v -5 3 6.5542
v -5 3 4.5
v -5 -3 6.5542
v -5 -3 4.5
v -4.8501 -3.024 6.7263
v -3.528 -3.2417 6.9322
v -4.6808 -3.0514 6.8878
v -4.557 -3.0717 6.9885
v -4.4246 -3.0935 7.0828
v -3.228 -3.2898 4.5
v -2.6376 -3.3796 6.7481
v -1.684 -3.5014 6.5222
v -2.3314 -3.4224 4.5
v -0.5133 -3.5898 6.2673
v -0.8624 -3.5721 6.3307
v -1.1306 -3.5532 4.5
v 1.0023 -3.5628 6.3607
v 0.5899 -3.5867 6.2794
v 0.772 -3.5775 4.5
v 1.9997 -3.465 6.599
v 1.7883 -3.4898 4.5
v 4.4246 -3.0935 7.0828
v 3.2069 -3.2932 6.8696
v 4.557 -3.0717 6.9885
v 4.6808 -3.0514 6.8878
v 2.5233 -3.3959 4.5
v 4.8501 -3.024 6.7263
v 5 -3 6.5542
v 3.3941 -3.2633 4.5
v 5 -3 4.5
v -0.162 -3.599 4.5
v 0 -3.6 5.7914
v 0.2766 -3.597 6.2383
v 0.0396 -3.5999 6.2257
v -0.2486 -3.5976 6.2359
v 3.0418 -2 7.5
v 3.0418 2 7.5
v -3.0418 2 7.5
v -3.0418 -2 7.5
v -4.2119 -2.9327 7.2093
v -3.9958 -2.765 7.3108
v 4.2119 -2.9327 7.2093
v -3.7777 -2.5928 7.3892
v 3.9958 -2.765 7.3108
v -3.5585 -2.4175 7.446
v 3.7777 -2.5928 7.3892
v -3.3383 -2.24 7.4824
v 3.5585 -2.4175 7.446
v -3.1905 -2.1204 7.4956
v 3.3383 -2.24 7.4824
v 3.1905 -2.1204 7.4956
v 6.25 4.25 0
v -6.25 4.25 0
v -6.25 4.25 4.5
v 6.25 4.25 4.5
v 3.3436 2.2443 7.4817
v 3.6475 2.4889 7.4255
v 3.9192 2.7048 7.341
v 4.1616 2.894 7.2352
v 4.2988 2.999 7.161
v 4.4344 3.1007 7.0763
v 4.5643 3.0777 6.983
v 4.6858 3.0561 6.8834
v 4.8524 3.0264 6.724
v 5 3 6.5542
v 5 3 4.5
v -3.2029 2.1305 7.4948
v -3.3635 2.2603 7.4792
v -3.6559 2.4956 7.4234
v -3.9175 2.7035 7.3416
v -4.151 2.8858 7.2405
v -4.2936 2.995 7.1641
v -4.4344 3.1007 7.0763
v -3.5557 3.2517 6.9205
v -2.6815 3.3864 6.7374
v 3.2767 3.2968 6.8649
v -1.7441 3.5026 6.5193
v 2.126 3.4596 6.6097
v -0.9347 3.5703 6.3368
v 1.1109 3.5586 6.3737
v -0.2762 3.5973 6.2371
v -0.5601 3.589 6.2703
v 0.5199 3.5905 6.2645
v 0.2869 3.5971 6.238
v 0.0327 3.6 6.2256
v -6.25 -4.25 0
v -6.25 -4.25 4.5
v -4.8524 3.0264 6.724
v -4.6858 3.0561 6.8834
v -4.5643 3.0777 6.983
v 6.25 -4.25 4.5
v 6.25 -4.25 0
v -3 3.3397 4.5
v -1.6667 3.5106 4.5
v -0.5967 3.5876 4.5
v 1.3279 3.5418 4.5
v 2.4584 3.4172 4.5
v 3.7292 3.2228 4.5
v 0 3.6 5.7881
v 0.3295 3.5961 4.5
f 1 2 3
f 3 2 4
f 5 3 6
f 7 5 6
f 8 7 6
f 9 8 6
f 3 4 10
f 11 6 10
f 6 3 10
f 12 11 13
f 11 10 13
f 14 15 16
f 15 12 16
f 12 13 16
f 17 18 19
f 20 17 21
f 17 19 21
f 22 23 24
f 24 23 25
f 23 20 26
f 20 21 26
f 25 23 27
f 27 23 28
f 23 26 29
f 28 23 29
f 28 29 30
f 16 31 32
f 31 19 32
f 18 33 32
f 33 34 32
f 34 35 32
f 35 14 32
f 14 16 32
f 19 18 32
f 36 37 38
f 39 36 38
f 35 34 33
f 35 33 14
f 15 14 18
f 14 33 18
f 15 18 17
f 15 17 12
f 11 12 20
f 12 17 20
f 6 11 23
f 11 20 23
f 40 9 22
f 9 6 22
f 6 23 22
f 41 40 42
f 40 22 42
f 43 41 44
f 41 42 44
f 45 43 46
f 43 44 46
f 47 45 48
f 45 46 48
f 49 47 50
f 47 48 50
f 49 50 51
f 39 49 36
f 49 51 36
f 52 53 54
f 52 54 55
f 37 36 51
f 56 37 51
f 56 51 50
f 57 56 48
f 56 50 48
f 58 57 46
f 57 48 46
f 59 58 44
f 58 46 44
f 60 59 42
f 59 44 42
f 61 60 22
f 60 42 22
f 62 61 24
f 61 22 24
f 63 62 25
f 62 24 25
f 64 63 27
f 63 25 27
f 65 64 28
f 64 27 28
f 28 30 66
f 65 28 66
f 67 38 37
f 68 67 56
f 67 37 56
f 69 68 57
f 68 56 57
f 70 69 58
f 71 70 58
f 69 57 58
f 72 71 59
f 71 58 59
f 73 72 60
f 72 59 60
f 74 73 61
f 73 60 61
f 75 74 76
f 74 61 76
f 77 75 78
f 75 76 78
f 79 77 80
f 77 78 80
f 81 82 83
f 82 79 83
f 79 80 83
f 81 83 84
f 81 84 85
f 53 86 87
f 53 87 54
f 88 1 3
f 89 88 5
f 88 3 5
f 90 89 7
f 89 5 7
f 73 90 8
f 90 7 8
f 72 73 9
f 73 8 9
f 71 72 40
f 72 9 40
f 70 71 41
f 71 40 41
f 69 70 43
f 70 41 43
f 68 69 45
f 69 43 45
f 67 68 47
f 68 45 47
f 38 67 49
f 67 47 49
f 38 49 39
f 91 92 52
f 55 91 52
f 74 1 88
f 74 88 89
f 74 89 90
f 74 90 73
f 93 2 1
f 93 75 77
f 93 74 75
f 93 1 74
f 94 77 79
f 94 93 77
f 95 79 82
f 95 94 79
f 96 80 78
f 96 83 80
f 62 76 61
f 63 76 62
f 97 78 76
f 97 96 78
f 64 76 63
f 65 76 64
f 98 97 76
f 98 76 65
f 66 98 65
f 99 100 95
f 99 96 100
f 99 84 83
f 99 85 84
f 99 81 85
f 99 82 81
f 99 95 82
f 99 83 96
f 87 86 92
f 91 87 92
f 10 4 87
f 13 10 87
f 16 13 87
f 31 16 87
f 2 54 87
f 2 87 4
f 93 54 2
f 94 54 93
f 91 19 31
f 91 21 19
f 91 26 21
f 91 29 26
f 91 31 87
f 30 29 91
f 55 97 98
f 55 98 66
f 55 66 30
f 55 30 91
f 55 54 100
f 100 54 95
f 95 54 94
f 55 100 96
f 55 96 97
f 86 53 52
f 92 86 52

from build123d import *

# Parameters (mm, degrees)
F0_W     = 12.5
F0_H     = 8.5
F1_DEPTH = 4.5
F3_DEPTH = 3
F5_DEPTH = 12.5
F7_DEPTH = 12.5


with BuildPart() as f1:
    # F0 (on Top) → F1 (new body)
    with BuildSketch(Plane.XY):
        Rectangle(F0_W, F0_H)
    extrude(amount=F1_DEPTH)

    # F2 (on face) → F3 (join)
    with BuildSketch(Plane.XY.offset(4.5)):
        with BuildLine():
            add(Edge.make_bspline(
                [(-5, 3), (-3.3333333333, 3.2975326627), (0, 3.9024673373), (3.3333333333, 3.2975326627), (5, 3)],
                knots=[0, 0, 0, 0, 0.5, 1, 1, 1, 1], degree=3))
            Line((-5, 3), (-5, -3))
            add(Edge.make_bspline(
                [(-5, -3), (-3.3333333333, -3.2644556938), (0, -3.9355443062), (3.3333333333, -3.2644556938), (5, -3)],
                knots=[0, 0, 0, 0, 0.5, 1, 1, 1, 1], degree=3))
            Line((5, -3), (5, 3))
        make_face()
    extrude(amount=F3_DEPTH)

    # F4 (on Front) → F5 (cut, symmetric)
    with BuildSketch(Plane.XZ):
        with BuildLine():
            Line((5.0418378521, 7.7276835956), (-5.0418378521, 7.7276835956))
            Line((-5.0418378521, 7.7276835956), (-5.0418378521, 6.5))
            ThreePointArc((-5.0418378521, 6.5), (-4.1598718408, 7.2360679775), (-3.0418378521, 7.5))
            Line((-3.0418378521, 7.5), (3.0418378521, 7.5))
            ThreePointArc((3.0418378521, 7.5), (4.1598718408, 7.2360679775), (5.0418378521, 6.5))
            Line((5.0418378521, 6.5), (5.0418378521, 7.7276835956))
        make_face()
    extrude(amount=F5_DEPTH, both=True, mode=Mode.SUBTRACT)

    # F6 (on Right) → F7 (cut, symmetric)
    with BuildSketch(Plane.YZ):
        with BuildLine():
            Line((3.6354335025, 6), (3.6354335025, 7.9630231485))
            Line((3.6354335025, 7.9630231485), (-3.6354335025, 7.9630231485))
            Line((-3.6354335025, 7.9630231485), (-3.6354335025, 6))
            ThreePointArc((-3.6354335025, 6), (-3.1095768046, 7.0682118062), (-2, 7.5))
            Line((-2, 7.5), (2, 7.5))
            ThreePointArc((2, 7.5), (3.1095768046, 7.0682118062), (3.6354335025, 6))
        make_face()
    extrude(amount=F7_DEPTH, both=True, mode=Mode.SUBTRACT)


solid = f1.part
